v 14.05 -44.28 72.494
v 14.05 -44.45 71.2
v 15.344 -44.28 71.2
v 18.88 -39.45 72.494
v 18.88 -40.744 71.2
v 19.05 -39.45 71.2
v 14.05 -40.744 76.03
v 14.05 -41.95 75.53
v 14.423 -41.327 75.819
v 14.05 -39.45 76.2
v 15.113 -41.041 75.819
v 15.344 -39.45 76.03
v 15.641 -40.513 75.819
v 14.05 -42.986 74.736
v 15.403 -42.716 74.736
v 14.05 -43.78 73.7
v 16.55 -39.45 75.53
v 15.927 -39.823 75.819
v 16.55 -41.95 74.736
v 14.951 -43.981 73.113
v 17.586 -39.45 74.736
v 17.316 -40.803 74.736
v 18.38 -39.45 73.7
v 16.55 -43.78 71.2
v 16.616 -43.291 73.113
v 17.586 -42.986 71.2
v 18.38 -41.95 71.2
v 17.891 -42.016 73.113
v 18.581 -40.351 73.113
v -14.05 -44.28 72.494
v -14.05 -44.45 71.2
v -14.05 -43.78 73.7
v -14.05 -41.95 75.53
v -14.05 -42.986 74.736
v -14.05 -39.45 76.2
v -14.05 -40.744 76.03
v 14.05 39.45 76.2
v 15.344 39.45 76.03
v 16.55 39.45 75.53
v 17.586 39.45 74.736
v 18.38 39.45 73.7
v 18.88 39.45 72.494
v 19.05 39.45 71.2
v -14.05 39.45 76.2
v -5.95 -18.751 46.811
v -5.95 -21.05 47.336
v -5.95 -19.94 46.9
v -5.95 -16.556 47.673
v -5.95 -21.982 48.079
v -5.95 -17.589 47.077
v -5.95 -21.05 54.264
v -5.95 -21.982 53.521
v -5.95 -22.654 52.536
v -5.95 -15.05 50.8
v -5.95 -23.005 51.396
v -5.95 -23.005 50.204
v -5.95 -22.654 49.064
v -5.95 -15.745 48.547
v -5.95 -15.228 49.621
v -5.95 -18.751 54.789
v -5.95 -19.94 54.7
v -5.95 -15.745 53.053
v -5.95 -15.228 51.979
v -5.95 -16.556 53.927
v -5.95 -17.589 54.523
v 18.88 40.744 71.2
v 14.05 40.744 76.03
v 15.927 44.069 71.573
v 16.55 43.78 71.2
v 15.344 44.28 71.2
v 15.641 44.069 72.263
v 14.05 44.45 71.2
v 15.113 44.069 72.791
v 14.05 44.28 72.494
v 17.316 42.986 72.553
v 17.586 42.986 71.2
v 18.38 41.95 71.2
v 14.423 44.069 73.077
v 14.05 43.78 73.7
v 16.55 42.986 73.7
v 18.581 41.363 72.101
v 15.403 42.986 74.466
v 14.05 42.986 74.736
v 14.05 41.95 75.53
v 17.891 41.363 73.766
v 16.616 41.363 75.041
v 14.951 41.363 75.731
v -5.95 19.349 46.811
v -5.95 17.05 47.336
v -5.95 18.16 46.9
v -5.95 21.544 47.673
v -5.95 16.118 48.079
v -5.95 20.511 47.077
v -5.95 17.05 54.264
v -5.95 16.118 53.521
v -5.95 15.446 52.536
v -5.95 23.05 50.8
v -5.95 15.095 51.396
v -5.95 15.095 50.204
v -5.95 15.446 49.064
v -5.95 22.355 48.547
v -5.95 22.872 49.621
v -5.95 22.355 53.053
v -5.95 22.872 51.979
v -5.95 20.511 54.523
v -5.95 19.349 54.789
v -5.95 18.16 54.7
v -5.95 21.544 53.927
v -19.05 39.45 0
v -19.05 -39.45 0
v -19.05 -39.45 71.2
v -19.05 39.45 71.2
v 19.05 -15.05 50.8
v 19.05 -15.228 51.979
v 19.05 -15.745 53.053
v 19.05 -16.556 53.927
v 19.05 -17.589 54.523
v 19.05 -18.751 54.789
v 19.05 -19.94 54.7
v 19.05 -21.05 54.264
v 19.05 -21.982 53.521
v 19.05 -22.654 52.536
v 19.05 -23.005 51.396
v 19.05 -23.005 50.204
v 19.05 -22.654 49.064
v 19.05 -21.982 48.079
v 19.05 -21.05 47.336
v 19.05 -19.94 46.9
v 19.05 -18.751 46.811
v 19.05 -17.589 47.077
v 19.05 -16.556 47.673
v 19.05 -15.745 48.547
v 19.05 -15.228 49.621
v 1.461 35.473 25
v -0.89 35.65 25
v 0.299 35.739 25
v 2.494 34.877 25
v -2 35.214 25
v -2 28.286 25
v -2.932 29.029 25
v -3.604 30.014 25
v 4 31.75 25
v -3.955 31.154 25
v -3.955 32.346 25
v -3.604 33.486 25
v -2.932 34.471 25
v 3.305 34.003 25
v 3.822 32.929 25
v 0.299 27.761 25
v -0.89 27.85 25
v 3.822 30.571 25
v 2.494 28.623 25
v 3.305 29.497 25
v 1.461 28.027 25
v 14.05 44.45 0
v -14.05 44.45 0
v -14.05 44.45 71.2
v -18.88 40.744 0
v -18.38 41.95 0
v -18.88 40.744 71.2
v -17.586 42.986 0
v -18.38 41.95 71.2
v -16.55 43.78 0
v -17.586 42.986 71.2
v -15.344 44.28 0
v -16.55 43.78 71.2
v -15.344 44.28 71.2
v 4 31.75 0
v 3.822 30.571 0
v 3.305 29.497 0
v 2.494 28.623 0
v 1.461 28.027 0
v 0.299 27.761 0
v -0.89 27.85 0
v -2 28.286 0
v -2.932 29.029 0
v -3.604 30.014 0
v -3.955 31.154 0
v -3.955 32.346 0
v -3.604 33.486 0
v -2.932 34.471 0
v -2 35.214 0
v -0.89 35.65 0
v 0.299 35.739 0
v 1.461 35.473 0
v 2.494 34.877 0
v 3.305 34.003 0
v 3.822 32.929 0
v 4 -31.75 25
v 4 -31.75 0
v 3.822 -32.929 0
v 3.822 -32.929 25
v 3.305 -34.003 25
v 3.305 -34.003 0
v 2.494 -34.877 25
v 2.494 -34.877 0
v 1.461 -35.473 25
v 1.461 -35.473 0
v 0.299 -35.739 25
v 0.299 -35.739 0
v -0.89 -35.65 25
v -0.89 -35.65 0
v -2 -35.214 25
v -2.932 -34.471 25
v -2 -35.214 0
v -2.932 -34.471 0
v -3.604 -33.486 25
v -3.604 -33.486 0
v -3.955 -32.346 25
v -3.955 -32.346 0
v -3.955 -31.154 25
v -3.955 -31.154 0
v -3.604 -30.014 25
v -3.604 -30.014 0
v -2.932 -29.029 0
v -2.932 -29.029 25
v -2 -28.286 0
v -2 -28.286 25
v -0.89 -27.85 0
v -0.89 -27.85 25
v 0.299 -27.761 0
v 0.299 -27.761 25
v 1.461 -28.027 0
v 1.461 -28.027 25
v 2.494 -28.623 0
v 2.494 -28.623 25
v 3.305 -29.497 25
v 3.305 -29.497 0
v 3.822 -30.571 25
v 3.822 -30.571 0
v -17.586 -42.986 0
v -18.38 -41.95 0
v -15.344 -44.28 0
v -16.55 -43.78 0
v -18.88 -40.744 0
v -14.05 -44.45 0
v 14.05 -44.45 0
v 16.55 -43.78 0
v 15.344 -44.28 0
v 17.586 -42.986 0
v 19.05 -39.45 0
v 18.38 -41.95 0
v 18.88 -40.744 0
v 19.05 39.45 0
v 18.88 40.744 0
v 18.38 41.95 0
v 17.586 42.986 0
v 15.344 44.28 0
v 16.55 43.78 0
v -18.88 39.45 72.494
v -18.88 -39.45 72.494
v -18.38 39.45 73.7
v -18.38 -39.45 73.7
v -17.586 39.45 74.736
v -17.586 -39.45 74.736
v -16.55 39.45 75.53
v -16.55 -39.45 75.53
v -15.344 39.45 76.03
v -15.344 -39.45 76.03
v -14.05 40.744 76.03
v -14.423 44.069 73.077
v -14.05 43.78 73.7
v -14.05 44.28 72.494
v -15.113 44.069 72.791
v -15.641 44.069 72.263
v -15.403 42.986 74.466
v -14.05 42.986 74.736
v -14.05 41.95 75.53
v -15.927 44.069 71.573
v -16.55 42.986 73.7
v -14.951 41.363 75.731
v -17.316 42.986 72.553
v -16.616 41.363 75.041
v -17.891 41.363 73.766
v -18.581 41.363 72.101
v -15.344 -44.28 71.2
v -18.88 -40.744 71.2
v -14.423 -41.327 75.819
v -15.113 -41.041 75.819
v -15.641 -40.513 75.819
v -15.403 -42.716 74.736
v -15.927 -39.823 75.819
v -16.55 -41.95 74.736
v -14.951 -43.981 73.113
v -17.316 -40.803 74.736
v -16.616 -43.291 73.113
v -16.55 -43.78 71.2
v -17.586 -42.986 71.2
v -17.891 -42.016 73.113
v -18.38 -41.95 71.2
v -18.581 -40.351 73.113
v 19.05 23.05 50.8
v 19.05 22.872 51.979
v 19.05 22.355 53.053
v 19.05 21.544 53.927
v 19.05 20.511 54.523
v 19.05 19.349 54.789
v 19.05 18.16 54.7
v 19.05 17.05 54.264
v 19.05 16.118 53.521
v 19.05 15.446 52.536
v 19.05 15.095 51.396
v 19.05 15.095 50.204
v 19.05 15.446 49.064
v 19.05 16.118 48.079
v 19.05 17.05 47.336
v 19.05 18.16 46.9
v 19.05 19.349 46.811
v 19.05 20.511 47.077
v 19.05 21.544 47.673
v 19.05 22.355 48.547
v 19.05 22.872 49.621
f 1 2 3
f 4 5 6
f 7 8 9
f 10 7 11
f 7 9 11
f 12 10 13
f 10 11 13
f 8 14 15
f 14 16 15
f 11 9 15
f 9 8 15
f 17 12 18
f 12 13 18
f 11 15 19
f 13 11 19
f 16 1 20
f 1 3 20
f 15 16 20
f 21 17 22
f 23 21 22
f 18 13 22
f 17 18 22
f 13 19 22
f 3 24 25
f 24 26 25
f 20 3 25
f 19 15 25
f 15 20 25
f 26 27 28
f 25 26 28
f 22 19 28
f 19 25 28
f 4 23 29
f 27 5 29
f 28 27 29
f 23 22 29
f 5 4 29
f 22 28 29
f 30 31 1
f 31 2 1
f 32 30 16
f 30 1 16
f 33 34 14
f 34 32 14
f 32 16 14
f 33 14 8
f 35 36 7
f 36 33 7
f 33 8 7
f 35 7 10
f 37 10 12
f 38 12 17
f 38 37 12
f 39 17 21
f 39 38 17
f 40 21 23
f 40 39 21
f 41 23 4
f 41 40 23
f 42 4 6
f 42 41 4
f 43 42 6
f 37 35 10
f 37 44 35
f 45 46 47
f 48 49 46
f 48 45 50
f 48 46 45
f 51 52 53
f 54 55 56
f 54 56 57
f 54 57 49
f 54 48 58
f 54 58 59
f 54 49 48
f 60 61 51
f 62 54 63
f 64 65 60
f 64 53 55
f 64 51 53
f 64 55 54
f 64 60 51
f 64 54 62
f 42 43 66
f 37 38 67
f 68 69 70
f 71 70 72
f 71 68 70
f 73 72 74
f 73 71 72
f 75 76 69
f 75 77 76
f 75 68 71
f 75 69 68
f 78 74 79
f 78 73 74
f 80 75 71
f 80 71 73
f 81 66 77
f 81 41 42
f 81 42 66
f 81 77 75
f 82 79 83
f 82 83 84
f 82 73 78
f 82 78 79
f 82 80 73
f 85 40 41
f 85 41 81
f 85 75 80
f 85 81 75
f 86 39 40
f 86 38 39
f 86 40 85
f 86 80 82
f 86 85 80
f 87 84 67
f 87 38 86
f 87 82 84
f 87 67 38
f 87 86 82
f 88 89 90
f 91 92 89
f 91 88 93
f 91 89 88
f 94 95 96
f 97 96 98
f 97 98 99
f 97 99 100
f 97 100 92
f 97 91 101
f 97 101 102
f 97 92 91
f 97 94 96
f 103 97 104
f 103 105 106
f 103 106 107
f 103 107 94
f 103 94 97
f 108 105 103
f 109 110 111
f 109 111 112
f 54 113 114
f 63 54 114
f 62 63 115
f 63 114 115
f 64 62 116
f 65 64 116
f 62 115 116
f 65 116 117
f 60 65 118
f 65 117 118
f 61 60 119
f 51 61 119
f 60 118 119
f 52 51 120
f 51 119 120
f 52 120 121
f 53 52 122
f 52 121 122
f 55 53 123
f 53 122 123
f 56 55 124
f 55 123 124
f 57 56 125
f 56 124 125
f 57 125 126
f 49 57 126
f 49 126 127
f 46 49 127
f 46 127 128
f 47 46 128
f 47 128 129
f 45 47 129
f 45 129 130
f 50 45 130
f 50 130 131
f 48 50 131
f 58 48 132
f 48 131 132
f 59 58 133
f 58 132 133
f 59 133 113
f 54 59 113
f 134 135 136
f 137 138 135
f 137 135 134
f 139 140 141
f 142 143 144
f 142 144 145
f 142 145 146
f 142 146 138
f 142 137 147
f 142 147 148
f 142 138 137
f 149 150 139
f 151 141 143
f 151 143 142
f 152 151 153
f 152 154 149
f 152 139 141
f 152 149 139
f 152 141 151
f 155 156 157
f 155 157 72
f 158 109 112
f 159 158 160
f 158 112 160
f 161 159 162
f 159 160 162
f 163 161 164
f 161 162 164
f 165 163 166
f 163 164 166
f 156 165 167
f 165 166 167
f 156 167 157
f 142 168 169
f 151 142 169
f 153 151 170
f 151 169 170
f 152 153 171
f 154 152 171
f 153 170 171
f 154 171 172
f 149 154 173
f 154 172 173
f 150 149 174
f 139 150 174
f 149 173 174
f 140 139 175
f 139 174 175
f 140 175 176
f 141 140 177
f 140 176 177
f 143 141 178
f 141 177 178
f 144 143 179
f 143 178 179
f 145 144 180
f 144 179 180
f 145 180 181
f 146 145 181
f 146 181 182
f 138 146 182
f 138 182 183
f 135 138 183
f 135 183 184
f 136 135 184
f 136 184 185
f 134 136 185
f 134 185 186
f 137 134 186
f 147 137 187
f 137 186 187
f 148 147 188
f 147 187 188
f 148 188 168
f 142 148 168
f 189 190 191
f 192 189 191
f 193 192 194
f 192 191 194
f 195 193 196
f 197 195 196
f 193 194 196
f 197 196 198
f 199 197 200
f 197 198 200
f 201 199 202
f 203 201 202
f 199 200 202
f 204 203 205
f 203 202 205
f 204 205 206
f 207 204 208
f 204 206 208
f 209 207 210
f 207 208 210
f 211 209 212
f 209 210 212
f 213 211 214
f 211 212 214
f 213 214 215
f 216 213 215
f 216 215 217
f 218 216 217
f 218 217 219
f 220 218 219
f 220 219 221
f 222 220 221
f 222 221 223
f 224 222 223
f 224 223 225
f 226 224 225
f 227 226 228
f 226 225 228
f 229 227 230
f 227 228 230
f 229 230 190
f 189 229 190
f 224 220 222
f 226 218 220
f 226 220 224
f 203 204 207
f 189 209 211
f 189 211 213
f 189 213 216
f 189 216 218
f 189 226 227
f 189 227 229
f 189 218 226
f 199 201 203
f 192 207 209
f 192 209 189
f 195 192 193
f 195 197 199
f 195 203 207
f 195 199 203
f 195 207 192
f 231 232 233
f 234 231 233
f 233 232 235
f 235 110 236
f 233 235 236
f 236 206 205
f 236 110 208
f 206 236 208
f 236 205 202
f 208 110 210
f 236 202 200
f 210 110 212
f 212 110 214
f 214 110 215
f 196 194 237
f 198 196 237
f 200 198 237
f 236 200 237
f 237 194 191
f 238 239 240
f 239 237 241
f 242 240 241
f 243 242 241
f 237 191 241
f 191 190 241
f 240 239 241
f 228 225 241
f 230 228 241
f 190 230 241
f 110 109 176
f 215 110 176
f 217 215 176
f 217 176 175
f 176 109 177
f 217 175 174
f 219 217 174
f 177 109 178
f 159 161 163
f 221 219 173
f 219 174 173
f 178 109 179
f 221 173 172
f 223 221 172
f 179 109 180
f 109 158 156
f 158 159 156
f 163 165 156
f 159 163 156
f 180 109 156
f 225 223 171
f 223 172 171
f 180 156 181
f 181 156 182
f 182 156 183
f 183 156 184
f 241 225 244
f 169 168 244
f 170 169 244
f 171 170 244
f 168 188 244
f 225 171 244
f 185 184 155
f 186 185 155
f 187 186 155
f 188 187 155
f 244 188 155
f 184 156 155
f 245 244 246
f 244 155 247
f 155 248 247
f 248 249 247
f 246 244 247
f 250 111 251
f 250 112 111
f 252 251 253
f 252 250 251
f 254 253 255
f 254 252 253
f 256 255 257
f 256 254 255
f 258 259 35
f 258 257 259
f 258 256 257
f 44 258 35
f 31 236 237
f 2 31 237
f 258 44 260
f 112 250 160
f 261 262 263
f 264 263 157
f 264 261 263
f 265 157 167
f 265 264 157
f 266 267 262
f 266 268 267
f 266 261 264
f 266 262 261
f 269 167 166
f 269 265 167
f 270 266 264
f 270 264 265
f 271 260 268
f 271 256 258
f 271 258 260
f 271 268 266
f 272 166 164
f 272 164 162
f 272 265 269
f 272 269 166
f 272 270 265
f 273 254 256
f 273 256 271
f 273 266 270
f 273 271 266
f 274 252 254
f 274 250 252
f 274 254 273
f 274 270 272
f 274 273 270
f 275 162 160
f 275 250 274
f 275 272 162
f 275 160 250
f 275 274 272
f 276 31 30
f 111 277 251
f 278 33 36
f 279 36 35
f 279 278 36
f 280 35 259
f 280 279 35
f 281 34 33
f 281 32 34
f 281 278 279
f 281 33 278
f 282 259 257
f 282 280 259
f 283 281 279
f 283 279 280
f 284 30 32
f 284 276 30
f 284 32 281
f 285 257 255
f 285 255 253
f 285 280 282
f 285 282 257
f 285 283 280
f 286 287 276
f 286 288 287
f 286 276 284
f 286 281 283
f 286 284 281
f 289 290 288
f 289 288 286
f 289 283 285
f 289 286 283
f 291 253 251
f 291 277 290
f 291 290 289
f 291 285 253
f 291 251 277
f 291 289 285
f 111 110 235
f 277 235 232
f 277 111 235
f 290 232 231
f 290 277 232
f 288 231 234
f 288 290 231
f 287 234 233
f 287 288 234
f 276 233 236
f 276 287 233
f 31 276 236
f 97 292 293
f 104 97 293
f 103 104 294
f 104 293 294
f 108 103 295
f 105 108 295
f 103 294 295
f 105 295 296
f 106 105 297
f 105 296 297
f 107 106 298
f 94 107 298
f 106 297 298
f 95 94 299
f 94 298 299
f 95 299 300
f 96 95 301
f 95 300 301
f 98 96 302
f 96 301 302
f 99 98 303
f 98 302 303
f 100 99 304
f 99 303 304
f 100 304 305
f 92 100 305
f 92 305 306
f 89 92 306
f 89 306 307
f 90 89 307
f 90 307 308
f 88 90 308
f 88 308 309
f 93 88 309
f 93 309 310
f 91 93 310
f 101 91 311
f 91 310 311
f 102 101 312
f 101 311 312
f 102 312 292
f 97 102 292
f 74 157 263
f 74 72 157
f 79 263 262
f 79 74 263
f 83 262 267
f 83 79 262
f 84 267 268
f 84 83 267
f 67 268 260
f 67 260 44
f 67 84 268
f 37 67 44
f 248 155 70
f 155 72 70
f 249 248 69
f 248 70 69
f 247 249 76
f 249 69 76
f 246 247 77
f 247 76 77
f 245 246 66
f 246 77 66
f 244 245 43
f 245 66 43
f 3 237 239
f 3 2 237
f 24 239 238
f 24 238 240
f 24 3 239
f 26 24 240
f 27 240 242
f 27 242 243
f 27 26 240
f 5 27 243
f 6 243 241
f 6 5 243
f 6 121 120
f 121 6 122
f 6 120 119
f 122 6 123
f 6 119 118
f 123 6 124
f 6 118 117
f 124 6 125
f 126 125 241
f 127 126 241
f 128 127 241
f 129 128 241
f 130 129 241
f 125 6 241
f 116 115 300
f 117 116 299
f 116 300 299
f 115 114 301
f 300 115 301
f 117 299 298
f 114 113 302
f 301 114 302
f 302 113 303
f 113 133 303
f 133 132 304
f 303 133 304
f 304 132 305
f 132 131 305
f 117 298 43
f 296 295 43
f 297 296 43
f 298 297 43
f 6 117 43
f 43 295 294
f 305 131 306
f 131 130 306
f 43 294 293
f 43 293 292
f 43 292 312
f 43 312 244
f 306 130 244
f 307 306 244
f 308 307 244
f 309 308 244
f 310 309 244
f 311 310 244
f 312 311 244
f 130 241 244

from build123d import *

# Parameters (mm, degrees)
F0_W     = 38.1
F0_H     = 88.9
F1_DEPTH = 76.2
F2_R     = 4
F3_DEPTH = 25
F4_R     = 4
F5_DEPTH = 25
F6_R     = 5


with BuildPart() as f1:
    # F0 (on Top) → F1 (new body)
    with BuildSketch(Plane.XY):
        Rectangle(F0_W, F0_H)
    extrude(amount=F1_DEPTH)

    # F2 (on face) → F3 (cut)
    with BuildSketch(Plane(origin=(0, 0, 0), x_dir=(1, 0, 0), z_dir=(0, 0, -1))):
        with Locations((0, 31.75)):
            Circle(F2_R)
        with Locations((0, -31.75)):
            Circle(F2_R)
    extrude(amount=-F3_DEPTH, mode=Mode.SUBTRACT)

    # F4 (on face) → F5 (cut)
    with BuildSketch(Plane.YZ.offset(19.05)):
        with Locations((-19.05, 50.8)):
            Circle(F4_R)
        with Locations((19.05, 50.8)):
            Circle(F4_R)
    extrude(amount=-F5_DEPTH, mode=Mode.SUBTRACT)

    # F6
    f6_edges = [f1.edges().sort_by_distance(p)[0] for p in [
        (-19.05, -44.45, 38.1),
        (19.05, -44.45, 38.1),
        (0, -44.45, 76.2),
        (-19.05, 0, 76.2),
        (19.05, 0, 76.2),
        (19.05, 44.45, 38.1),
        (0, 44.45, 76.2),
        (-19.05, 44.45, 38.1),
    ]]
    fillet(f6_edges, radius=F6_R)


solid = f1.part
